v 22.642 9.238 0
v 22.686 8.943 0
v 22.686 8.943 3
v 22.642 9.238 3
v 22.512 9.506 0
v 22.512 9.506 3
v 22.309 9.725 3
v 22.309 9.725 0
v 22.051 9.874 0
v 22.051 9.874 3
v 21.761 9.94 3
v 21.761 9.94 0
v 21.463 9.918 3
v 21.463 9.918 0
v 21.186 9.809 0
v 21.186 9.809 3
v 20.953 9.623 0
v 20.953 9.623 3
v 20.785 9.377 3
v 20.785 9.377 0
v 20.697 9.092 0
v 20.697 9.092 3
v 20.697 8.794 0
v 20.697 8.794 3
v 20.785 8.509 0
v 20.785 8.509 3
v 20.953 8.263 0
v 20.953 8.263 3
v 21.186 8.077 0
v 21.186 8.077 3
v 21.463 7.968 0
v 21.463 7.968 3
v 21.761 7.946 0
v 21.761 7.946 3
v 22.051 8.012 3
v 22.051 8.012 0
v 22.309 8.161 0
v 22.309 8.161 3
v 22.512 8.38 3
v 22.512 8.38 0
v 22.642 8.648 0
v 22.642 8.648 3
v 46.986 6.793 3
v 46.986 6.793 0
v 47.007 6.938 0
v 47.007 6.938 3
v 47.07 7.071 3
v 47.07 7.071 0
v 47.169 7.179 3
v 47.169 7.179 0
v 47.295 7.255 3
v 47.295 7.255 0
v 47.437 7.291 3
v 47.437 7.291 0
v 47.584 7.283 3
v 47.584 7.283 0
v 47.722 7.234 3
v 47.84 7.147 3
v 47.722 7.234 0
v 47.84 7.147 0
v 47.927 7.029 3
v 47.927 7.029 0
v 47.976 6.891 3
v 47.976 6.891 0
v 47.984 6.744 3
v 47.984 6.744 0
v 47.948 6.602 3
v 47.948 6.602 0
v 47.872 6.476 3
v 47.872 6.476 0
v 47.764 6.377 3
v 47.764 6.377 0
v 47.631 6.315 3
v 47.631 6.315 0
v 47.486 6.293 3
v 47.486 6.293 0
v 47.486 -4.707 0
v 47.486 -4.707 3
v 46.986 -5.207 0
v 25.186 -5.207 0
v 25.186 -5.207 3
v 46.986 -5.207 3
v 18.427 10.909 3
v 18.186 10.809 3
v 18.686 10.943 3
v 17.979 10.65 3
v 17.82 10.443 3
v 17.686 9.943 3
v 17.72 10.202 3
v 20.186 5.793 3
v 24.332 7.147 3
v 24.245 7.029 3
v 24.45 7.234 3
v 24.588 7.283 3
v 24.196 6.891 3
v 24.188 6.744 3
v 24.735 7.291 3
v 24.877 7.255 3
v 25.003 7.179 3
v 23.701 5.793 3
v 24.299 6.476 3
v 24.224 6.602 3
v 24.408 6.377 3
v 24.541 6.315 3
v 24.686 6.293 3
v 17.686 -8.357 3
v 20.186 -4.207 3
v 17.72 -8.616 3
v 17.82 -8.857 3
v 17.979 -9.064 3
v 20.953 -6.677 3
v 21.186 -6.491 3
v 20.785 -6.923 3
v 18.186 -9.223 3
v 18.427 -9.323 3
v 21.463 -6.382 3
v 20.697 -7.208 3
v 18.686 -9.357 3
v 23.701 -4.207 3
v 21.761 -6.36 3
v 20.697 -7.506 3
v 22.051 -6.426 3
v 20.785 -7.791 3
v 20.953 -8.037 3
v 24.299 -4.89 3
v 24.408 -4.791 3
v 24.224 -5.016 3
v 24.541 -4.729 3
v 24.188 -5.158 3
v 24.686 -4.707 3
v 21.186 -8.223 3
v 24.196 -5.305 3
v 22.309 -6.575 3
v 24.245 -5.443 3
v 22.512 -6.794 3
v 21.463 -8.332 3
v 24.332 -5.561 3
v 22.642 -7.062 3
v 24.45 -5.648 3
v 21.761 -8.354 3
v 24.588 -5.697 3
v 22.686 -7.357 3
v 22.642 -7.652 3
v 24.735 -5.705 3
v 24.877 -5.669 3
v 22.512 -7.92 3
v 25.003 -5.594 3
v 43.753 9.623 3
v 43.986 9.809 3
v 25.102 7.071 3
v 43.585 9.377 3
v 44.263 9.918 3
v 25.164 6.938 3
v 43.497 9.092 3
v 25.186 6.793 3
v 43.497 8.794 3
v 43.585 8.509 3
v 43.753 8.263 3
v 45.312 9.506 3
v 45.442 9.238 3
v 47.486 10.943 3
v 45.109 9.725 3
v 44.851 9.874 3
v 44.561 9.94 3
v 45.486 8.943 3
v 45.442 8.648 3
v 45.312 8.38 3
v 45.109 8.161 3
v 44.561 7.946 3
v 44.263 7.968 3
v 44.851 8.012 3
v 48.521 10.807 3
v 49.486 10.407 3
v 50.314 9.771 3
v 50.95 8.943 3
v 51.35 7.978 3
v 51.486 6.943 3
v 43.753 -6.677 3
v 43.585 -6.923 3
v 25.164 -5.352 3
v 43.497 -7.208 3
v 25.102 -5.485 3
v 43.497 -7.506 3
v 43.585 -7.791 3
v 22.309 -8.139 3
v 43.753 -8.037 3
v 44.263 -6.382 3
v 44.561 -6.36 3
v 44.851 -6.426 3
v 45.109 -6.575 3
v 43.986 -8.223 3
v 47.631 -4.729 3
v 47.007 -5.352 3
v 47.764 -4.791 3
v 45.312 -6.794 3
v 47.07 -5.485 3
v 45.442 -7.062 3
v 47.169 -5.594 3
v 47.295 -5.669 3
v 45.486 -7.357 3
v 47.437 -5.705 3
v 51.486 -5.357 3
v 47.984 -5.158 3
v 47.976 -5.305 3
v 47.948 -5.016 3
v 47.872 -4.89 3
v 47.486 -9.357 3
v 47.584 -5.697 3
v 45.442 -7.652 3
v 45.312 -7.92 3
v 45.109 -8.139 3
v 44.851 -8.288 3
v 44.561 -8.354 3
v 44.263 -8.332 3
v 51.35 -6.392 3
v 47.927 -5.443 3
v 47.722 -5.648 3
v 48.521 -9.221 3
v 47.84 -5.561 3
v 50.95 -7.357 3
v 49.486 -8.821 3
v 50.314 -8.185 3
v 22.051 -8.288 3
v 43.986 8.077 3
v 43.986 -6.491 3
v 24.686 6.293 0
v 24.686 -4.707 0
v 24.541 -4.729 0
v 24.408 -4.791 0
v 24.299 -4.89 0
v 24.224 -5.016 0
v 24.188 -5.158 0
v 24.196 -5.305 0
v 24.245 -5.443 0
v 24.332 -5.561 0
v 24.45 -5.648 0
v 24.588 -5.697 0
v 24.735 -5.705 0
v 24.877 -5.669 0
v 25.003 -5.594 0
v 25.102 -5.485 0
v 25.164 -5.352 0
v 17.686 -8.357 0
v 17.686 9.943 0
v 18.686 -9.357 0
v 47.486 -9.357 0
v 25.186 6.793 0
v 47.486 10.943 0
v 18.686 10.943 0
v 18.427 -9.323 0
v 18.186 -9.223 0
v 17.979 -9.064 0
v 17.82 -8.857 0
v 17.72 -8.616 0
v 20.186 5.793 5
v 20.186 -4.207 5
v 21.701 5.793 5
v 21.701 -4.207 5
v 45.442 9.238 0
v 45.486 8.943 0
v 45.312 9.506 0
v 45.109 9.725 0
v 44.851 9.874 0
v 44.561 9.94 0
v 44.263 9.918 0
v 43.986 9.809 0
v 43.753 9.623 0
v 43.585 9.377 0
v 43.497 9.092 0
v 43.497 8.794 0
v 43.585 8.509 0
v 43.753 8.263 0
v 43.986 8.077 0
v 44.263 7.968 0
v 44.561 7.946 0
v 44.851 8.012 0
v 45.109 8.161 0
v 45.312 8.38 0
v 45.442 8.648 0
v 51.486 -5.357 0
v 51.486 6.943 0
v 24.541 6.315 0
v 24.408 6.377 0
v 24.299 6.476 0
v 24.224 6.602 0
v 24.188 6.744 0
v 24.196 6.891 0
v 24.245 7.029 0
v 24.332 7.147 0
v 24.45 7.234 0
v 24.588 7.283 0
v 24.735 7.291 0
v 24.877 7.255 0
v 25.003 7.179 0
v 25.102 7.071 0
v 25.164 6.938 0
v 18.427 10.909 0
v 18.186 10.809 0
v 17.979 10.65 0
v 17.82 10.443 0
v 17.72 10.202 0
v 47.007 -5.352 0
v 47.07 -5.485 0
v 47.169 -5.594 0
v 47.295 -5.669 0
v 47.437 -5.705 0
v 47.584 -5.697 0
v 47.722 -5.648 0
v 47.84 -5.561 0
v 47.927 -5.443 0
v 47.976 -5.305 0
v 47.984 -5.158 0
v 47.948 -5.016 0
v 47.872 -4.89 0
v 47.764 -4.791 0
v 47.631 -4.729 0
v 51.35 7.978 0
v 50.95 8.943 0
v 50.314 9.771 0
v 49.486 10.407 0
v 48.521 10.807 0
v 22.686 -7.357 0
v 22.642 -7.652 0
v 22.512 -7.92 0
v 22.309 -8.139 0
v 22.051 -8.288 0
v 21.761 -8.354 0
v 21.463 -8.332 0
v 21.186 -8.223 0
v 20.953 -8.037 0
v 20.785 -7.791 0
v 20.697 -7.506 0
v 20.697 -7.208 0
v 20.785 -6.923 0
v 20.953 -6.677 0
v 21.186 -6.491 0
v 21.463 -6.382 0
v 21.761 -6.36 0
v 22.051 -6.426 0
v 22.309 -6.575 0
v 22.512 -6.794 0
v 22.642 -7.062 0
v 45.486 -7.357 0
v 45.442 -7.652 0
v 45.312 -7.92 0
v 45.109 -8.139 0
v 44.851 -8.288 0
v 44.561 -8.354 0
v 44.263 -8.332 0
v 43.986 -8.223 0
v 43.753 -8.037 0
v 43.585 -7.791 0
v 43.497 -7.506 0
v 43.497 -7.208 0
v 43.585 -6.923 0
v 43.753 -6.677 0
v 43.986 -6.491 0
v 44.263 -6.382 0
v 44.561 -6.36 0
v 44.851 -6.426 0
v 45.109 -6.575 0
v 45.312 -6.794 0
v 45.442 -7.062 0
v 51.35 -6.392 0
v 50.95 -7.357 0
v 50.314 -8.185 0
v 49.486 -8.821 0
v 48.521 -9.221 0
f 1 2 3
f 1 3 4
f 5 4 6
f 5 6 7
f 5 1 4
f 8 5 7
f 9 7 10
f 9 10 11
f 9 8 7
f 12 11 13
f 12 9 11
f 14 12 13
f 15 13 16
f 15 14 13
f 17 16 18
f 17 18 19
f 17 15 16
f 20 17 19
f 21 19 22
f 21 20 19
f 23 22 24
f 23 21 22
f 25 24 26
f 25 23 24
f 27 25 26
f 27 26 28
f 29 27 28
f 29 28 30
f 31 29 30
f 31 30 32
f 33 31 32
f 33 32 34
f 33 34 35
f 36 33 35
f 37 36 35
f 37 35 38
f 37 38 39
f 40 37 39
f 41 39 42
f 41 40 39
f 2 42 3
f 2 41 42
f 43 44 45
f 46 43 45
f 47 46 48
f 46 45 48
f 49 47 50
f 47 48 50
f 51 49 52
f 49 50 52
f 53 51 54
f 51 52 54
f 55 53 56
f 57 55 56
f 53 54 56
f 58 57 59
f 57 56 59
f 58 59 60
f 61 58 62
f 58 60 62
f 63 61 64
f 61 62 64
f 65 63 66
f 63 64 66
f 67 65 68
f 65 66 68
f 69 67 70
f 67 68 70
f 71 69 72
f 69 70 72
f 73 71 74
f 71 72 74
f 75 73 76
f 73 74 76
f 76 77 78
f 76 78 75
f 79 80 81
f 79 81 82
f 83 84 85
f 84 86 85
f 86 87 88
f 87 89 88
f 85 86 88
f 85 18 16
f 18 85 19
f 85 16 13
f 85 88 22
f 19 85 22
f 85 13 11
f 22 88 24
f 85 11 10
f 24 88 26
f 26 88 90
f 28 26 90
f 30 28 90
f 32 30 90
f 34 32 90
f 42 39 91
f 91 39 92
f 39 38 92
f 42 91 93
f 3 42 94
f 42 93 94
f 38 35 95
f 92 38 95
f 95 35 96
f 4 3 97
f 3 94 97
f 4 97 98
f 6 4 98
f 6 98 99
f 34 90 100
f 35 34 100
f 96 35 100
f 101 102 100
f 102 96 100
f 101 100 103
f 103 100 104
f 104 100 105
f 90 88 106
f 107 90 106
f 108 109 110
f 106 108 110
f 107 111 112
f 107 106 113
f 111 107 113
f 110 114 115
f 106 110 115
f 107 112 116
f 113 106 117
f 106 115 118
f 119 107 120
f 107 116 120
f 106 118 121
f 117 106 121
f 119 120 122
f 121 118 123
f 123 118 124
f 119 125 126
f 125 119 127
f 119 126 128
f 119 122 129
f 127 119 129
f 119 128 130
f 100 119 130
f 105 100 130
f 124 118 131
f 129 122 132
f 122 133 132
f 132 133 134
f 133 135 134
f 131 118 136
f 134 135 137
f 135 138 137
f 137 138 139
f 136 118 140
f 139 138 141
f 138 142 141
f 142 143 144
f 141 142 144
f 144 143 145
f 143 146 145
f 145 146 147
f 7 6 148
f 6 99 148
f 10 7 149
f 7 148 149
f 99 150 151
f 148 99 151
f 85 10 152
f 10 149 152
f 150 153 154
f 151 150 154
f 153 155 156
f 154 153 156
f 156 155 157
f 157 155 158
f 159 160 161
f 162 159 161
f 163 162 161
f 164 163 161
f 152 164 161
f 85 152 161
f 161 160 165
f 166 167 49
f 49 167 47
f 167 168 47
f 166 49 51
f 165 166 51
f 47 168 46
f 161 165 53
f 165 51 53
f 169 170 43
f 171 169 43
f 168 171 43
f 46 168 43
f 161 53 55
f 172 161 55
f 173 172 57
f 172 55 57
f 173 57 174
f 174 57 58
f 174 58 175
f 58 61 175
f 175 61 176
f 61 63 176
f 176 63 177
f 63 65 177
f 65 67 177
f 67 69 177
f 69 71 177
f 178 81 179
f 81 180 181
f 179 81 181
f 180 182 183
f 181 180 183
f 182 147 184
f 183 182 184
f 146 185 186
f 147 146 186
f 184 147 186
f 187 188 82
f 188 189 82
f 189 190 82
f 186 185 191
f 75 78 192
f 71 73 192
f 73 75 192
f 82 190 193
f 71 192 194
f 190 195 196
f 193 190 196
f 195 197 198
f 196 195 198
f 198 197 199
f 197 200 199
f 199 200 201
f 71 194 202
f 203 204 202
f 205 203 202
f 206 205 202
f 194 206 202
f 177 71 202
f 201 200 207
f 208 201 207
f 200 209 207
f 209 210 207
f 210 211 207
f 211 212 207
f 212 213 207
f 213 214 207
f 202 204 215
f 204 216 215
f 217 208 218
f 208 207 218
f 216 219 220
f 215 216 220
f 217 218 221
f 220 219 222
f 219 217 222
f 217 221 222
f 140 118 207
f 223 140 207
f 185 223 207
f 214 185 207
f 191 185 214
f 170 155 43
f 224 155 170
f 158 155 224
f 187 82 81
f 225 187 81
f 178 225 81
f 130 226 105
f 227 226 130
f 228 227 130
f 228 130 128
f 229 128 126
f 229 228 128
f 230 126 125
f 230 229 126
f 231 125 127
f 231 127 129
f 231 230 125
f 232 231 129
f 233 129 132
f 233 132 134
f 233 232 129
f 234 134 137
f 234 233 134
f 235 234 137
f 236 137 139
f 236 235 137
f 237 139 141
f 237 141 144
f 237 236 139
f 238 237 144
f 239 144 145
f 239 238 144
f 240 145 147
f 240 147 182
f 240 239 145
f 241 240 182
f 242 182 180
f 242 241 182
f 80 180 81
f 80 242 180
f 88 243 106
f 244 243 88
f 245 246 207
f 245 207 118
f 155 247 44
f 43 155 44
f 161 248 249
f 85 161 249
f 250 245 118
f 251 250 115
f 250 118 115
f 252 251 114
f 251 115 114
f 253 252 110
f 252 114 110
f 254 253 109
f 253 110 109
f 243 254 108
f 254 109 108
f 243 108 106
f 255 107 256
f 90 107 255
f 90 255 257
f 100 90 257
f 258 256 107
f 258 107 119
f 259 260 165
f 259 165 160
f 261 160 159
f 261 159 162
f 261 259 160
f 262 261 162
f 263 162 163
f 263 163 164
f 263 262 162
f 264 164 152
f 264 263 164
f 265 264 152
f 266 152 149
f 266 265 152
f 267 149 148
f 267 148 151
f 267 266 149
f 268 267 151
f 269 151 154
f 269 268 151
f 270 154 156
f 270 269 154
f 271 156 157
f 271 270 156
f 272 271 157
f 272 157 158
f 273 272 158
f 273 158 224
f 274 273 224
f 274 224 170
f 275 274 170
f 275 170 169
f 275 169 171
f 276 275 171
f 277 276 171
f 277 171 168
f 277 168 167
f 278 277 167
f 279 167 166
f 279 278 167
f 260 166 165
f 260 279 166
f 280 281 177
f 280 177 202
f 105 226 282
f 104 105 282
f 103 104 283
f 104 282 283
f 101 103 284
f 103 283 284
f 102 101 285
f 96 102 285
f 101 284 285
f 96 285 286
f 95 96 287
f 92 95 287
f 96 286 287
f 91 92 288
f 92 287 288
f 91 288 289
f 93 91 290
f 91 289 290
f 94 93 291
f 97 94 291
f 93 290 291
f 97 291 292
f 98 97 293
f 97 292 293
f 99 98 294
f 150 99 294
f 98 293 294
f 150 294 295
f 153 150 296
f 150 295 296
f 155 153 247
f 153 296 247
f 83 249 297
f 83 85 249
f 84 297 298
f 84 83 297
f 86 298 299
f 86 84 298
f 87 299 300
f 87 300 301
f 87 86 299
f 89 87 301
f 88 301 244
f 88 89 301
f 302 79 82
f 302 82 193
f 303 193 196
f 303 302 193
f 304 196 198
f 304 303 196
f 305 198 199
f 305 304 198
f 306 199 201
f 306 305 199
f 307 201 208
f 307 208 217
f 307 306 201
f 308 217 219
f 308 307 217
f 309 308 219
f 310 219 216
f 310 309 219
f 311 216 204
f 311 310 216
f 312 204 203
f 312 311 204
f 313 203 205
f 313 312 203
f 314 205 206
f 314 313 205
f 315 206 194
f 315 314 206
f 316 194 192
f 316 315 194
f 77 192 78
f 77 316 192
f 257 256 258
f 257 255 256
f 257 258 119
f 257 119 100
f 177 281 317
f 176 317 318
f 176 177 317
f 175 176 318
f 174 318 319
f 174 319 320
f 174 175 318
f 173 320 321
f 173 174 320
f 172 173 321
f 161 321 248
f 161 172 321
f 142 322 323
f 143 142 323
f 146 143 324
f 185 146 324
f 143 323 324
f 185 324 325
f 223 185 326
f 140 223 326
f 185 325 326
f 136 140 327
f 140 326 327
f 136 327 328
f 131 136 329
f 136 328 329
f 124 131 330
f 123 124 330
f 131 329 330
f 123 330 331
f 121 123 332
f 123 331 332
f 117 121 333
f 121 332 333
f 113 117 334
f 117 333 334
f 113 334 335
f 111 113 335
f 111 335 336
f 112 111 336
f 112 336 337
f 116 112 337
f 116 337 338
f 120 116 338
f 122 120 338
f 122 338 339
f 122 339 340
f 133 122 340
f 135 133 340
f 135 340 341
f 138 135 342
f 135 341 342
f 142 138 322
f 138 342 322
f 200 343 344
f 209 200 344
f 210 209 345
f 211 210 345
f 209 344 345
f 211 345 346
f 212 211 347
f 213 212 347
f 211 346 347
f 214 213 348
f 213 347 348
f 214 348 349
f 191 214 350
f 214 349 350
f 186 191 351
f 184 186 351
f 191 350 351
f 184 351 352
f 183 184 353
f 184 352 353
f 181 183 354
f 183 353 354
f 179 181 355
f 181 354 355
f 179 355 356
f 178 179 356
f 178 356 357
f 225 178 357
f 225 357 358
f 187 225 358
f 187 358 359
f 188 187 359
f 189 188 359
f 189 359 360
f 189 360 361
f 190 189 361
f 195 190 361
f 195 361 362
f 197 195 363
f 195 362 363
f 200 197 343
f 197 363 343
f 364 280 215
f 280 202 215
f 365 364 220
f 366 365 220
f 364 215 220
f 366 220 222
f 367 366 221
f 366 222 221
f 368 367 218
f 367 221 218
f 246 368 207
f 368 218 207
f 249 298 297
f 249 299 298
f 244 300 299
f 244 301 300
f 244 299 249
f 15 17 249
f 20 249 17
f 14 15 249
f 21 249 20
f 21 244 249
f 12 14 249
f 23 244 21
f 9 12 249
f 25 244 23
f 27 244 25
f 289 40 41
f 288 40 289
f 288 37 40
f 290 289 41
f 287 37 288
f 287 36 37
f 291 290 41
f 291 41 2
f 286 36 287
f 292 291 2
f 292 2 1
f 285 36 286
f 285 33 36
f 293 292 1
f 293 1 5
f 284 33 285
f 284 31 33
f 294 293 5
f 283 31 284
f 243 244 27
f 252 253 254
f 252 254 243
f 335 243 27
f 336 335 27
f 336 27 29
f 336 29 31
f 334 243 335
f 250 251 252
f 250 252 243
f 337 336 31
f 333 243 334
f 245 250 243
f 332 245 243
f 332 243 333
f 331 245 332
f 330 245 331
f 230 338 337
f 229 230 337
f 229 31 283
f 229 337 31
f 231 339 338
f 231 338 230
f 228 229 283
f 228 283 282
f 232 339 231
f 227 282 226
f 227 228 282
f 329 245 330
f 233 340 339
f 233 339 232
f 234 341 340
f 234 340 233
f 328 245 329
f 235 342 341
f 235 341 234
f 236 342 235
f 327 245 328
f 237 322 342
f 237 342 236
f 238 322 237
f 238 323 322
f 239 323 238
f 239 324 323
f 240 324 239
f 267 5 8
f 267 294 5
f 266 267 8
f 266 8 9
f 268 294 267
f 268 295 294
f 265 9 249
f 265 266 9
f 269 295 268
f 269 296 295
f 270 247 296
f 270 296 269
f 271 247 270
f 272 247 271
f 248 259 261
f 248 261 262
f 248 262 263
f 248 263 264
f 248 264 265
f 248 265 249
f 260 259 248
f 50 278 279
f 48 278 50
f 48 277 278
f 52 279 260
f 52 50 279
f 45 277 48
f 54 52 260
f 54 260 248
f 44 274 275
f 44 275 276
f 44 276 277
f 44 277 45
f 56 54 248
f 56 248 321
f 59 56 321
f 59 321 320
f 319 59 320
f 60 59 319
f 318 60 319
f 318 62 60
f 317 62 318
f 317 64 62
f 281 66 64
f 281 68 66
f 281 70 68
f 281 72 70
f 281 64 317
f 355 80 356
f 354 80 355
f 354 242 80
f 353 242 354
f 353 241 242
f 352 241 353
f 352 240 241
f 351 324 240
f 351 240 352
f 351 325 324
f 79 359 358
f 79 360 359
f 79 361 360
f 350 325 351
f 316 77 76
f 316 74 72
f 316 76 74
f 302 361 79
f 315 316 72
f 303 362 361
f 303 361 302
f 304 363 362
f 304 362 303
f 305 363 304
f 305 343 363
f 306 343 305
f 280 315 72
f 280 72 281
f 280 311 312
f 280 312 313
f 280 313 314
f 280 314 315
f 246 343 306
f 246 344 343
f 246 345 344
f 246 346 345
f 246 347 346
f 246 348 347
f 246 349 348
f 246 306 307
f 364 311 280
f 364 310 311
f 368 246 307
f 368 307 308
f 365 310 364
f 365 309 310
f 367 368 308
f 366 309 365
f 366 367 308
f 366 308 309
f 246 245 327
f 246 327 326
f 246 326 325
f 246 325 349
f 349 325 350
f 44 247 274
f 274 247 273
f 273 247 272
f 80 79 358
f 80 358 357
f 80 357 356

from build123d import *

# Parameters (mm, degrees)
SKETCH2_R           = 1
BOSS_EXTRUDE1_DEPTH = 3
SKETCH3_W           = 3.515258844
SKETCH3_H           = 10
BOSS_EXTRUDE2_DEPTH = 2
CHAMFER1_SIZE       = 2
FILLET1_R           = 4
FILLET2_R           = 1


with BuildPart() as part:
    # Sketch2 → Boss-Extrude1 (new body)
    with BuildSketch(Plane.XY):
        with BuildLine():
            Line((47.48595993, 0.792979965), (51.48595993, 0.792979965))
            Line((51.48595993, 0.792979965), (51.48595993, 10.942979965))
            Line((51.48595993, 10.942979965), (17.68595993, 10.942979965))
            Line((17.68595993, 10.942979965), (17.68595993, 0.792979965))
            Line((17.68595993, 0.792979965), (24.68595993, 0.792979965))
            Line((24.68595993, 0.792979965), (24.68595993, 6.292979965))
            ThreePointArc((24.68595993, 6.292979965), (24.33240654, 7.146533356), (25.18595993, 6.792979965))
            Line((25.18595993, 6.792979965), (46.98595993, 6.792979965))
            ThreePointArc((46.98595993, 6.792979965), (47.839513321, 7.146533356), (47.48595993, 6.292979965))
            Line((47.48595993, 6.292979965), (47.48595993, 0.792979965))
        make_face()
        with Locations((44.48595993, 8.942979965)):
            Circle(SKETCH2_R, mode=Mode.SUBTRACT)
        with Locations((21.68595993, 8.942979965)):
            Circle(SKETCH2_R, mode=Mode.SUBTRACT)
    extrude(amount=BOSS_EXTRUDE1_DEPTH)

    # Mirror1: part across plane


with BuildPart() as part_1:
    add(part.part)
    add(part.part.mirror(Plane(origin=(0, 0.792979965, 3), x_dir=(0, 0, 1), z_dir=(0, -1, 0))))

    # Sketch3 → Boss-Extrude2 (add)
    with BuildSketch(Plane.XY.offset(3)):
        with Locations((21.943589352, 0.792979965)):
            Rectangle(SKETCH3_W, SKETCH3_H)
    extrude(amount=BOSS_EXTRUDE2_DEPTH)

    # Chamfer1
    chamfer1_edges = [part_1.edges().sort_by_distance(p)[0] for p in [
        (23.701218774, 0.792979965, 5),
    ]]
    chamfer(chamfer1_edges, length=CHAMFER1_SIZE - 0.0001)  # a hair under: the kernel refuses the full size

    # Fillet1
    fillet1_edges = [part_1.edges().sort_by_distance(p)[0] for p in [
        (51.48595993, 10.942979965, 1.5),
        (51.48595993, -9.357020035, 1.5),
    ]]
    fillet(fillet1_edges, radius=FILLET1_R)

    # Fillet2
    fillet2_edges = [part_1.edges().sort_by_distance(p)[0] for p in [
        (17.68595993, 10.942979965, 1.5),
        (17.68595993, -9.357020035, 1.5),
    ]]
    fillet(fillet2_edges, radius=FILLET2_R)


solid = part_1.part
